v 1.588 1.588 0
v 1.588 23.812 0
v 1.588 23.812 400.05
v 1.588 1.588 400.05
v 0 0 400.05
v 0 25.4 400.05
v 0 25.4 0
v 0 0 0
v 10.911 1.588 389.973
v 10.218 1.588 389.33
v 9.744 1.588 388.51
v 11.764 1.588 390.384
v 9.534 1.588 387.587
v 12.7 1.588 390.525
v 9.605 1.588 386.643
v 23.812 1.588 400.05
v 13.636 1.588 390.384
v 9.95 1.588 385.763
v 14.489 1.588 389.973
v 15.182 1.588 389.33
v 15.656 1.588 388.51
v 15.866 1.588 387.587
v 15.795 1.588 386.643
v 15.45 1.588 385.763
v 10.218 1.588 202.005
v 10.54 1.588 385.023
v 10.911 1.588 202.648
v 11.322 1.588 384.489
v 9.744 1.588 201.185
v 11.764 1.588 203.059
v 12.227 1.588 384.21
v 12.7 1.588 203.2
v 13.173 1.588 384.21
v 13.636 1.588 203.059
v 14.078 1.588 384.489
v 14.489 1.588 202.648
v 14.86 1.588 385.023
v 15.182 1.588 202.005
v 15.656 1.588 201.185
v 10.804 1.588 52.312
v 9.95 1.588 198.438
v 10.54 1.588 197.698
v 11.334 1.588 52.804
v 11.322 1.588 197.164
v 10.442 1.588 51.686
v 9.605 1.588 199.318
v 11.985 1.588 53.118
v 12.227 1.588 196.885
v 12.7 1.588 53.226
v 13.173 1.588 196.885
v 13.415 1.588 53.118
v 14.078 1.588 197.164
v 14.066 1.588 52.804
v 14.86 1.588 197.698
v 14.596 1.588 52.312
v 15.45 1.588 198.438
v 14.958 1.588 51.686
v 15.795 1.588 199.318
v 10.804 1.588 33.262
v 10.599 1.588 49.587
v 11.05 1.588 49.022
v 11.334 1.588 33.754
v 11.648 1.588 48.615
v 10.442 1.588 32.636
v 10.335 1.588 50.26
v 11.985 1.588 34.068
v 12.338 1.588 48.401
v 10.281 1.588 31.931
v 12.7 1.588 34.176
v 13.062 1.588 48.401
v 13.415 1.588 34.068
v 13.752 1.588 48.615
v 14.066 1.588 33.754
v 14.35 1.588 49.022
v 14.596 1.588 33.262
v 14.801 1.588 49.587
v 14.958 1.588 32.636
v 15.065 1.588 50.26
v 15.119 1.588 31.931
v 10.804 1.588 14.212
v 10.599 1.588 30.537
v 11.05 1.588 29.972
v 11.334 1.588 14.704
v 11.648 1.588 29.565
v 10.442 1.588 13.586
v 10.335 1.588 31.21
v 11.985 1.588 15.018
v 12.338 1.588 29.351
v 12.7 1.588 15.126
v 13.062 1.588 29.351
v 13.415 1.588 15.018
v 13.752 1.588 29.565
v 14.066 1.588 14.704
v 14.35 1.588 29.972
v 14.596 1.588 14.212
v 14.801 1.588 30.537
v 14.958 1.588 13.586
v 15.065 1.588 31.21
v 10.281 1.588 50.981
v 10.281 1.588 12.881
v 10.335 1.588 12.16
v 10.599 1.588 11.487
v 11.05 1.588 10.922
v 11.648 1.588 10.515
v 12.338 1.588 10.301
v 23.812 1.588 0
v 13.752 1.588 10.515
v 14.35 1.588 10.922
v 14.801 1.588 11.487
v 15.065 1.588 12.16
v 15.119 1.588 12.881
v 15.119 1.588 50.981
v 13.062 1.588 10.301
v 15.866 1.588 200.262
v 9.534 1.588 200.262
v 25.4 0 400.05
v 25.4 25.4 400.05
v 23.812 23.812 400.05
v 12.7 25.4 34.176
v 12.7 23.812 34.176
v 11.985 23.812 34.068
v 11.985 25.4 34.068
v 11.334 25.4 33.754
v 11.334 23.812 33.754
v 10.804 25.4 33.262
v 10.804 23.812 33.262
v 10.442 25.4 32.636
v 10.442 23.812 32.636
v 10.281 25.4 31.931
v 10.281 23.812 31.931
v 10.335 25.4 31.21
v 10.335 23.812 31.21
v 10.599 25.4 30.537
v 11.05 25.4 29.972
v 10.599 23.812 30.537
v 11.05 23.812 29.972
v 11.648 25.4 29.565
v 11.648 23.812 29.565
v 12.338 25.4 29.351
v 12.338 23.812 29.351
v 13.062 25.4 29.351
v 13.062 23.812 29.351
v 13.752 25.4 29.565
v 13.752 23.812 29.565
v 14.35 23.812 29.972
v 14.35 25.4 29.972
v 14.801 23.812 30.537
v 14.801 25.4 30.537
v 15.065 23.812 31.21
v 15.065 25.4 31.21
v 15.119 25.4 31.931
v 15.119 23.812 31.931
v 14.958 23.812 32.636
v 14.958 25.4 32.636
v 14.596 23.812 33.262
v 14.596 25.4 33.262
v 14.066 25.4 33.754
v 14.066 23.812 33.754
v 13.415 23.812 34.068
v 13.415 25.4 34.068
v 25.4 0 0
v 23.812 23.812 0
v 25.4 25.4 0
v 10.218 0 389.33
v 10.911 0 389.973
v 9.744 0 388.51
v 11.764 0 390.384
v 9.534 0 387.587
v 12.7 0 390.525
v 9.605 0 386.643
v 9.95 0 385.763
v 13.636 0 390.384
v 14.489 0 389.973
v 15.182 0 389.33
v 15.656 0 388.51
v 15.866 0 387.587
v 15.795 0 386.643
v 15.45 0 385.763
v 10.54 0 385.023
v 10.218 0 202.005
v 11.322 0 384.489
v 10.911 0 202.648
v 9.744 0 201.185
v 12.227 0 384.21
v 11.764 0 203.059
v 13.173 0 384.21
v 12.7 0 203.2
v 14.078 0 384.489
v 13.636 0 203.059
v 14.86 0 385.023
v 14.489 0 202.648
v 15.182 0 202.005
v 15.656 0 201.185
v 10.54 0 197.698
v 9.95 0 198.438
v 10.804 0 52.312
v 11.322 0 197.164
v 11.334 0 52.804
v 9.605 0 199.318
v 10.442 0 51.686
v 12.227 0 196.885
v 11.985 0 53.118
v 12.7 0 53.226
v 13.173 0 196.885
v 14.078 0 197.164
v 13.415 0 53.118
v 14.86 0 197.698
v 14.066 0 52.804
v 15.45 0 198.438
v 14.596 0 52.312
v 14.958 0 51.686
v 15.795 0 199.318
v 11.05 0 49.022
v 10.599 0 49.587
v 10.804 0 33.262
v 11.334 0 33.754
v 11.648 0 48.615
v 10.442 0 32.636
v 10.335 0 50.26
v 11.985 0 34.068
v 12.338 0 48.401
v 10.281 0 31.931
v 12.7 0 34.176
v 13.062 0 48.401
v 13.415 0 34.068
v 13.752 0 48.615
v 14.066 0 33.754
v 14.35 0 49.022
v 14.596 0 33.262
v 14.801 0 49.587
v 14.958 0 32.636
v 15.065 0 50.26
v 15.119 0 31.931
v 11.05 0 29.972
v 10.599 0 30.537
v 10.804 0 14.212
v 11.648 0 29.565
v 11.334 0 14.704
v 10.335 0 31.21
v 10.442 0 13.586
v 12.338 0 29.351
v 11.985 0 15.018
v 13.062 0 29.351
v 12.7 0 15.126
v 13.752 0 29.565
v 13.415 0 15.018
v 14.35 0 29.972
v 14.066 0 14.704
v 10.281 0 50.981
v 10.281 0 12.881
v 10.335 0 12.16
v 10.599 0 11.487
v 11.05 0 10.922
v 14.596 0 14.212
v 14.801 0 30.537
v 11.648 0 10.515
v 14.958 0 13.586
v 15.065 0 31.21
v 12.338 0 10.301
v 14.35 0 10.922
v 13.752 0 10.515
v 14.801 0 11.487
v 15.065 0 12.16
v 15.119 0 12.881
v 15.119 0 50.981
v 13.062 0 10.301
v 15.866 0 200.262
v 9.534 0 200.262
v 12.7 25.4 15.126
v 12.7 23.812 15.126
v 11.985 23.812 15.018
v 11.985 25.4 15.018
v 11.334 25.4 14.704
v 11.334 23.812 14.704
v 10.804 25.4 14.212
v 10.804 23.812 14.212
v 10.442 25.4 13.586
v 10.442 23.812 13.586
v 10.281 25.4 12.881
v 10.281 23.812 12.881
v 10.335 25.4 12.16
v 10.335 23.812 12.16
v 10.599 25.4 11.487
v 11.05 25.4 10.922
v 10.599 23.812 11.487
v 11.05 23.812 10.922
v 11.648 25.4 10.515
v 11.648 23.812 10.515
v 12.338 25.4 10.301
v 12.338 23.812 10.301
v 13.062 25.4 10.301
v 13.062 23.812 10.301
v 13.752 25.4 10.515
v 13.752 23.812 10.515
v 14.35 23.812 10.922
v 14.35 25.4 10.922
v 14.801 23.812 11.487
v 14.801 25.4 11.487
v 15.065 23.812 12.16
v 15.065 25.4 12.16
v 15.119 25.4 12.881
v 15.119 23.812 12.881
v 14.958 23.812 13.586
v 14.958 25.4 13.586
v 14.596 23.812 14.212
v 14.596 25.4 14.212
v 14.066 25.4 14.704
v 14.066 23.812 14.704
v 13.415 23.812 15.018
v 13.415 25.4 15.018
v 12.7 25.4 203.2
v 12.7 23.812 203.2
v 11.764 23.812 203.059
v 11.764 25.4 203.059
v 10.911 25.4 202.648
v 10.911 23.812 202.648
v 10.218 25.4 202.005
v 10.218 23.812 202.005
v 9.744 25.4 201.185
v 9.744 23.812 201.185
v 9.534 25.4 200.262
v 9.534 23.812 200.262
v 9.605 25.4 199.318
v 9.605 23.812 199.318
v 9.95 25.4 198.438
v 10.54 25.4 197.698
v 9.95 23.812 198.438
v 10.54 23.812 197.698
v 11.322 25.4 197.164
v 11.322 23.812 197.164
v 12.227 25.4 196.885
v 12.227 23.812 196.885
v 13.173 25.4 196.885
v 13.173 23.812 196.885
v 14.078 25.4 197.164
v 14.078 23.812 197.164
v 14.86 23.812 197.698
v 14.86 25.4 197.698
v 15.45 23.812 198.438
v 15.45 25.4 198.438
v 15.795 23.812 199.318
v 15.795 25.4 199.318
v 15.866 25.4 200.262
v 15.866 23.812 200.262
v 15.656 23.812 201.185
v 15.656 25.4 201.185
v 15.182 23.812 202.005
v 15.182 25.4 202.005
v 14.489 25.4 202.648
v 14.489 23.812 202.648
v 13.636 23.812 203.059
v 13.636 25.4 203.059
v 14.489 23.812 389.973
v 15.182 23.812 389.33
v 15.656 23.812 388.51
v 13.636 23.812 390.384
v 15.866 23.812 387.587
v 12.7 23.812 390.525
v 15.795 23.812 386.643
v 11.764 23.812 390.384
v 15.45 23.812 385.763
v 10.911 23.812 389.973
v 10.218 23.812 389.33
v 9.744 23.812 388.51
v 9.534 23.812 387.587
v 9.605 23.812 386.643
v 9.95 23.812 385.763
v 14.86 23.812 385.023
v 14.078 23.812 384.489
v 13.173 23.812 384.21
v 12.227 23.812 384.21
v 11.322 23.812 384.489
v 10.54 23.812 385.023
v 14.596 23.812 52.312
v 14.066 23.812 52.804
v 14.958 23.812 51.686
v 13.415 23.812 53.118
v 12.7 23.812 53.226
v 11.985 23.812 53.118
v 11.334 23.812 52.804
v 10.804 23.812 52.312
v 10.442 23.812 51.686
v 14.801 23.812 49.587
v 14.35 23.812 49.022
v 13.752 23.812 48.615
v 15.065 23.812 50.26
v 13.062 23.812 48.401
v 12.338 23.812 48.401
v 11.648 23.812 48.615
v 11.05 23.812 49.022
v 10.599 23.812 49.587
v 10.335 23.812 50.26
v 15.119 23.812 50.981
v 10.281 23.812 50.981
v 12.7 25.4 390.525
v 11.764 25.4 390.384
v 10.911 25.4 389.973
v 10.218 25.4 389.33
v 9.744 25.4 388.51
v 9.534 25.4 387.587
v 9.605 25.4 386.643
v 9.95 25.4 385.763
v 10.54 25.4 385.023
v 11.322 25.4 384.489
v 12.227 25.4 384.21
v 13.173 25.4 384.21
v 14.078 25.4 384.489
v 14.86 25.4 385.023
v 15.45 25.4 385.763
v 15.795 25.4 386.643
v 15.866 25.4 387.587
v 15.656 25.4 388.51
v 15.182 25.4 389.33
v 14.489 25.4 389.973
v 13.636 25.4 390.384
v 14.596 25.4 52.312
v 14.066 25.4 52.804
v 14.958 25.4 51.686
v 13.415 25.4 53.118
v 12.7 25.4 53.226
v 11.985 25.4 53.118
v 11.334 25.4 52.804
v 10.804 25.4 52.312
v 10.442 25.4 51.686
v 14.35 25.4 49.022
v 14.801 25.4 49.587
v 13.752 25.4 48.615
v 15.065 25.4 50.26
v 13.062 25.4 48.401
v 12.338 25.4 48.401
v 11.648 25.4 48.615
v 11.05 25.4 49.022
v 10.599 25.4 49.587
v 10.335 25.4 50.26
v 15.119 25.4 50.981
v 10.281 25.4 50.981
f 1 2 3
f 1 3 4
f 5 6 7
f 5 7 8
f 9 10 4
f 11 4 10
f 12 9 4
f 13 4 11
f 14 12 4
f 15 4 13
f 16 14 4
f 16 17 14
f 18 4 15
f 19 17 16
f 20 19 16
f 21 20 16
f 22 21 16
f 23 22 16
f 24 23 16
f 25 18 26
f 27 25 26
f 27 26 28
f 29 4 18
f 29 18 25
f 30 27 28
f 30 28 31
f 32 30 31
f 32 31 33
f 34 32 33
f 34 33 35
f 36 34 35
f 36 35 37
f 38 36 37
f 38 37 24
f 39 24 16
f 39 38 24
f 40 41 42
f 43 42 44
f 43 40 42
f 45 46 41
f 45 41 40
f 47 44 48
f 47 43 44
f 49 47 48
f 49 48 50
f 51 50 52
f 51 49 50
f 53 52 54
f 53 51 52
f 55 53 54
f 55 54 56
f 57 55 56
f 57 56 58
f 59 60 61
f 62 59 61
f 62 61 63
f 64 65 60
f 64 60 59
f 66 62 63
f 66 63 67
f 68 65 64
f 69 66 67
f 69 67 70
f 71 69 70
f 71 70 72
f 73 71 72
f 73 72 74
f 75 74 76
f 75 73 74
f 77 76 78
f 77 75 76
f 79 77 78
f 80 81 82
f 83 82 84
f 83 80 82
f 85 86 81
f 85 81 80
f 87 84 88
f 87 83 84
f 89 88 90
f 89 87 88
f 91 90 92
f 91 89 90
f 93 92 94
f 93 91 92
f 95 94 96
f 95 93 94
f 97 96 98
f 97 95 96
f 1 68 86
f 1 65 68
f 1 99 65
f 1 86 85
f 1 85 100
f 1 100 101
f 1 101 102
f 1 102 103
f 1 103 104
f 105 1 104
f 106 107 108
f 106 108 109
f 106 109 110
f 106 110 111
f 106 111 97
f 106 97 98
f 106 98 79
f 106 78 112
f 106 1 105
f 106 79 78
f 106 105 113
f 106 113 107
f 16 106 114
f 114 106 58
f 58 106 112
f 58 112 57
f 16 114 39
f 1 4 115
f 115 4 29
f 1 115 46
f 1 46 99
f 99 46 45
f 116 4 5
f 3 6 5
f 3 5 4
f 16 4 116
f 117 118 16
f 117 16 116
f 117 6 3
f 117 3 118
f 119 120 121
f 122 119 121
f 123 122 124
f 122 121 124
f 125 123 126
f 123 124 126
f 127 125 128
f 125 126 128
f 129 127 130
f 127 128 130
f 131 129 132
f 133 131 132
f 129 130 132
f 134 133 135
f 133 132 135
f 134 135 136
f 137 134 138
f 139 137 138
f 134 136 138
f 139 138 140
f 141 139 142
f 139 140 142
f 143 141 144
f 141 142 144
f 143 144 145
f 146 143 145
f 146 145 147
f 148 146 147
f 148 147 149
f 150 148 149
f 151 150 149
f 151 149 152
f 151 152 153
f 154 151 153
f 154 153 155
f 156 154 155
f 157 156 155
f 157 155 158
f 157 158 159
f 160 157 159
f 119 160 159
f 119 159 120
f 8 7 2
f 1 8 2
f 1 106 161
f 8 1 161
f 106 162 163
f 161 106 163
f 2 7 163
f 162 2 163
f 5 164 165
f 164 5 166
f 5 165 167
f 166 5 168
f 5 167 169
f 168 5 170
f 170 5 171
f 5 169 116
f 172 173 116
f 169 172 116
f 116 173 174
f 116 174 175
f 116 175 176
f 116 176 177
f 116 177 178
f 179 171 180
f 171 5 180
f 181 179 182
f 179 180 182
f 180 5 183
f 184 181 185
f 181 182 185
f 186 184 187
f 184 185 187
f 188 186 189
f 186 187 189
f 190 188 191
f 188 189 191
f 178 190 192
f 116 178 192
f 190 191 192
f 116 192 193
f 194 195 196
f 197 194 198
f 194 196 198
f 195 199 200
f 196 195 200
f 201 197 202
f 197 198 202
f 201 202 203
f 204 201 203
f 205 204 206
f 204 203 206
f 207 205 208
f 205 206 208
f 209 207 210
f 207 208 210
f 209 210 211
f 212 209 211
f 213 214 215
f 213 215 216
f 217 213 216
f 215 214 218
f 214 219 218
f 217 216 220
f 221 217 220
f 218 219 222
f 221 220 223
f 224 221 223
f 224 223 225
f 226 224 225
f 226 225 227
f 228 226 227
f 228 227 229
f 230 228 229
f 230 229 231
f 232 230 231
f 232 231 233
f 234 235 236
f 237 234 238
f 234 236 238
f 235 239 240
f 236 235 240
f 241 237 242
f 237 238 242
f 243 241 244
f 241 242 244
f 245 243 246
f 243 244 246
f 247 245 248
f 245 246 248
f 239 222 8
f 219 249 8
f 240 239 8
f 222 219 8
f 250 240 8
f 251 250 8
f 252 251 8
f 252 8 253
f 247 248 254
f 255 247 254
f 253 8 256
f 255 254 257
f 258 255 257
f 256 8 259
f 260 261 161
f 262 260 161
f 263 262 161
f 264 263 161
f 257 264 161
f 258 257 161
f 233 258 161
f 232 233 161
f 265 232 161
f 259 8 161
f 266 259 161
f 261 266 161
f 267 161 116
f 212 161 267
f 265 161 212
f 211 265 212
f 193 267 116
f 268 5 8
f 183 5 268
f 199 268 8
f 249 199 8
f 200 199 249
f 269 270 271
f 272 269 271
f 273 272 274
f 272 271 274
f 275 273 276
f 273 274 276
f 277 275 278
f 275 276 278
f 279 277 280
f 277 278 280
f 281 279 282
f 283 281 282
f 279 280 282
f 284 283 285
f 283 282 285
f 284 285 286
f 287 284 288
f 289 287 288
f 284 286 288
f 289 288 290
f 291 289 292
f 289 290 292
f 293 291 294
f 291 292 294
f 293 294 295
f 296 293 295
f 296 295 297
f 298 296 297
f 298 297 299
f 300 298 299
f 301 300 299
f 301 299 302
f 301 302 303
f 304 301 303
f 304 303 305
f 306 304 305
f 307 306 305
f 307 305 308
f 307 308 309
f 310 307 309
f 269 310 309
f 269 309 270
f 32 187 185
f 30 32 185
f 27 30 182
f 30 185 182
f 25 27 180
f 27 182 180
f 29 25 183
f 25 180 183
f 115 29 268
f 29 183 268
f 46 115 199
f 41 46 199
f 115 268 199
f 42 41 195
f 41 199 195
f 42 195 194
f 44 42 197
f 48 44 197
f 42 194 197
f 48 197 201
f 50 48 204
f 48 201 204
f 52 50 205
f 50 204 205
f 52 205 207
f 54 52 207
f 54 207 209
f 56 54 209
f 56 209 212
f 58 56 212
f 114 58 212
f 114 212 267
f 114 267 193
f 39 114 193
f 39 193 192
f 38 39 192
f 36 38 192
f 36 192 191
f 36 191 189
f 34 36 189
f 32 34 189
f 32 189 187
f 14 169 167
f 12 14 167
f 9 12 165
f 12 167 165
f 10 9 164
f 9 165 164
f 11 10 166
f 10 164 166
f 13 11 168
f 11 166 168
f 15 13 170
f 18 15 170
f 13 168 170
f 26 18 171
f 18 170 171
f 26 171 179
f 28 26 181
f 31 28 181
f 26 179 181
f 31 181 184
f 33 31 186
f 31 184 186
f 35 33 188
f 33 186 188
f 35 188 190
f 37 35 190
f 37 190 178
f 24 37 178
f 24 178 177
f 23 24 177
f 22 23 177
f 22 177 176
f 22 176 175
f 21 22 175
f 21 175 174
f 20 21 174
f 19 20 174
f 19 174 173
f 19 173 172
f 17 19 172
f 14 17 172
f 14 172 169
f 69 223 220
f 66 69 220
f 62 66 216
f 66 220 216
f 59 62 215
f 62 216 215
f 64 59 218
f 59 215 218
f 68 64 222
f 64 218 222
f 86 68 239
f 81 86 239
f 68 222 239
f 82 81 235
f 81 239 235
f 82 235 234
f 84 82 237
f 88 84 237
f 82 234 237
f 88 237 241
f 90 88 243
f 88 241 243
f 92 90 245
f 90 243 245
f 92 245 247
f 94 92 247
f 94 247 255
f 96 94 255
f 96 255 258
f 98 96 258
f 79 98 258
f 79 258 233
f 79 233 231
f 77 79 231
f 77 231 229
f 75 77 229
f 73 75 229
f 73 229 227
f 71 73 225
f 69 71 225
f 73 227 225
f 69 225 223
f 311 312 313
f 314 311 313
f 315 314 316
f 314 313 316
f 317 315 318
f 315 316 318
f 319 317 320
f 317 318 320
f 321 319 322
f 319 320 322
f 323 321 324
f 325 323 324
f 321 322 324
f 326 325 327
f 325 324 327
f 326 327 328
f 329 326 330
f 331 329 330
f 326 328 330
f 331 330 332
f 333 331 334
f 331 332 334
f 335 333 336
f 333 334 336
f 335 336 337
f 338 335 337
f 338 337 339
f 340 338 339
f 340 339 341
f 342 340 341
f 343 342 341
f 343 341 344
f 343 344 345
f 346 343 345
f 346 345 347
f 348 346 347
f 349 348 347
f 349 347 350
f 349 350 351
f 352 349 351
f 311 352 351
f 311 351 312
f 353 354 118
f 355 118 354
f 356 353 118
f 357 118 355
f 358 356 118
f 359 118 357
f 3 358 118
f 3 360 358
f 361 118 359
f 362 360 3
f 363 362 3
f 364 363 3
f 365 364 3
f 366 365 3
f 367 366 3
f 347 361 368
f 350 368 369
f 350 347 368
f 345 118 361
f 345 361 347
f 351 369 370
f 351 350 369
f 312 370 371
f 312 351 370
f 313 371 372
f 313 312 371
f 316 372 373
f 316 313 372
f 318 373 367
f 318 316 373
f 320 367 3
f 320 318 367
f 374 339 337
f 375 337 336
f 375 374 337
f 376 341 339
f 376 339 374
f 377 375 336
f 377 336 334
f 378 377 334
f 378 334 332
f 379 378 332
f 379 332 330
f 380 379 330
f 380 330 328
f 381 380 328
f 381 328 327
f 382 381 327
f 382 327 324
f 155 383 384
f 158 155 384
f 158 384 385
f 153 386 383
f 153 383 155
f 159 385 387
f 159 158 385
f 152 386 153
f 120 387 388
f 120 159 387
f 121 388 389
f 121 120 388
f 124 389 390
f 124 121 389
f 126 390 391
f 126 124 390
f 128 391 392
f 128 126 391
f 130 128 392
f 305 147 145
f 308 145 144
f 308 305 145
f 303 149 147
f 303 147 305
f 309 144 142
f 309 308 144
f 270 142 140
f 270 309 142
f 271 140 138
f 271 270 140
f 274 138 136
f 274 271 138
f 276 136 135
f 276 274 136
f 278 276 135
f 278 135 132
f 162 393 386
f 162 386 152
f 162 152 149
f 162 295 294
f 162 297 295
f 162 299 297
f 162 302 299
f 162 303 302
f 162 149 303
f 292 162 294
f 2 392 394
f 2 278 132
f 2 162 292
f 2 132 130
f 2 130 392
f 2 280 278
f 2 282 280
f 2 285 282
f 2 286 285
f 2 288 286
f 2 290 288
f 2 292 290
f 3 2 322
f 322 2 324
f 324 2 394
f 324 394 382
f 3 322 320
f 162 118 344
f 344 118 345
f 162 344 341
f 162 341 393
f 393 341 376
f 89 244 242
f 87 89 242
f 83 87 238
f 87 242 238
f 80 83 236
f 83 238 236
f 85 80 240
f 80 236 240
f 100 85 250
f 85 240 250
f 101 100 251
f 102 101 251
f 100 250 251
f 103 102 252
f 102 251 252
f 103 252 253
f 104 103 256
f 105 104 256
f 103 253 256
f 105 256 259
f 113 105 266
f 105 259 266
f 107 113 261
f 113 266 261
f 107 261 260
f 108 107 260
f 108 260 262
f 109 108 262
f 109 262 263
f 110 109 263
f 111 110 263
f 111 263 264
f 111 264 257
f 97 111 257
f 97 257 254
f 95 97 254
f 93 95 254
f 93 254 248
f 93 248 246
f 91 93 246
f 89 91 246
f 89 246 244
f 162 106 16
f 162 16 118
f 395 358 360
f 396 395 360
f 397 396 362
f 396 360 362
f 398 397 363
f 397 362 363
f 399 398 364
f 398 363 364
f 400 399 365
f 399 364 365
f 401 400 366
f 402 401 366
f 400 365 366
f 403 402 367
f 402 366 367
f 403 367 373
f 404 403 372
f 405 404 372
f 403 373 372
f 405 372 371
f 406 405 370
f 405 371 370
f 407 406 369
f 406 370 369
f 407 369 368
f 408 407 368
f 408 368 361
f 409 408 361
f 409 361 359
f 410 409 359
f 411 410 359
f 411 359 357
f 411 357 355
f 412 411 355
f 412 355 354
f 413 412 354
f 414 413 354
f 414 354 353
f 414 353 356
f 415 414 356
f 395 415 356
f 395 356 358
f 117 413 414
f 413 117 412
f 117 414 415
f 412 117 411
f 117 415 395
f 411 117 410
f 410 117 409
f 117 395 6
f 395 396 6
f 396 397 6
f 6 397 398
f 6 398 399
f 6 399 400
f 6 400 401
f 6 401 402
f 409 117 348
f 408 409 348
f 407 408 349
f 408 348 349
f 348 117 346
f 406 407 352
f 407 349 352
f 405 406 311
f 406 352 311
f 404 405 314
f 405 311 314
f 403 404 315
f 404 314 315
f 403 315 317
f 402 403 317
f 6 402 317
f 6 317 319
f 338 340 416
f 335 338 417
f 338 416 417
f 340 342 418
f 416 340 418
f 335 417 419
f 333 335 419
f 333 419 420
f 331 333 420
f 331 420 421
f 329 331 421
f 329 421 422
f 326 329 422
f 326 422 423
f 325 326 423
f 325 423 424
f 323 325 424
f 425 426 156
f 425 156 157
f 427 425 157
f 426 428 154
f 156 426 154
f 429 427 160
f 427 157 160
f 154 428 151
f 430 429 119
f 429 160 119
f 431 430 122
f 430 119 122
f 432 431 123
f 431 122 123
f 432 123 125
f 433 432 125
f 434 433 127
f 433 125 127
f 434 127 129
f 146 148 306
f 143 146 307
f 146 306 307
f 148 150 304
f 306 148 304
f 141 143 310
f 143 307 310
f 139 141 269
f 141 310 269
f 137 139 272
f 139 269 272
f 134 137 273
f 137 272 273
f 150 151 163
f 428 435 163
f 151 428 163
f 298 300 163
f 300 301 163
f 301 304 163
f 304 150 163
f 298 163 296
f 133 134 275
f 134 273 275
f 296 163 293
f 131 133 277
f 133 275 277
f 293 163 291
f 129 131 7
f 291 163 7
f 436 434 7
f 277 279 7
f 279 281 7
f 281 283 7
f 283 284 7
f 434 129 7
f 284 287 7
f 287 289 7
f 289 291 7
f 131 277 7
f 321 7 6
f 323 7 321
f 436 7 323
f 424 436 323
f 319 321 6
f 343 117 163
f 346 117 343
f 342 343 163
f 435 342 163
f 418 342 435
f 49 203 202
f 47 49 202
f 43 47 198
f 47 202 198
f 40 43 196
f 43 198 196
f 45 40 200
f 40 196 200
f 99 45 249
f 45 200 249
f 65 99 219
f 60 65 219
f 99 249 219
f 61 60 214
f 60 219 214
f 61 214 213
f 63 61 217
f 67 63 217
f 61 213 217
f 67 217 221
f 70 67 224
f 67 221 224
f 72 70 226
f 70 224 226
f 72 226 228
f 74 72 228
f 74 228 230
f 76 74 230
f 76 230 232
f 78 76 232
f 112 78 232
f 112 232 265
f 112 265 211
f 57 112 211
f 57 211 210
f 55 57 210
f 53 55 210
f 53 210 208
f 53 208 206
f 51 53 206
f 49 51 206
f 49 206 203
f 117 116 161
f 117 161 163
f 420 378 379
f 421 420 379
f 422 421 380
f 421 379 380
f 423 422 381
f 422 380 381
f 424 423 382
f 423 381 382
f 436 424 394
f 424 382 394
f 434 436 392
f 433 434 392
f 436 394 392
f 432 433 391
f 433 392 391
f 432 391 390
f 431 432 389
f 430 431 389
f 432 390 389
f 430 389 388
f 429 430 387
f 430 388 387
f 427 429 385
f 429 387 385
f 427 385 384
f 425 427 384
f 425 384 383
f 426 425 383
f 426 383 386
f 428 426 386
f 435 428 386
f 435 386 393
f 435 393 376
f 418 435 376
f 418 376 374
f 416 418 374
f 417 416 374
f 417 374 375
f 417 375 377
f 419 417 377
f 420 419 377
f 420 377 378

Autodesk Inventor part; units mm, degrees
ref_plane "YZ Plane" through (0, 0, 0) normal (1, 0, 0) x (0, 1, 0)
ref_plane "XZ Plane" through (0, 0, 0) normal (0, 1, 0) x (-1, 0, 0)
ref_plane "XY Plane" through (0, 0, 0) normal (0, 0, 1) x (1, 0, 0)
sketch "Sketch1" plane through (0, 0, 0) normal (0, 0, 1) x (1, 0, 0)
  line L0 (0, 0) -> (25.4, 0)
  line L1 (25.4, 0) -> (25.4, 25.4)
  line L2 (25.4, 25.4) -> (0, 25.4)
  line L3 (0, 25.4) -> (0, 0)
  line L4 (1.5875, 1.5875) -> (23.8125, 1.5875)
  line L5 (23.8125, 1.5875) -> (23.8125, 23.8125)
  line L6 (23.8125, 23.8125) -> (1.5875, 23.8125)
  line L7 (1.5875, 23.8125) -> (1.5875, 1.5875)
  dimension "d0" = 25.4
  dimension "d1" = 25.4
  dimension "d2" = 1.5875
extrude "Extrusion1" add sketch "Sketch1" along normal blind 400.05
sketch "Sketch3" plane through (0, 25.4, 0) normal (0, 1, 0) x (1, 0, 0)
  line L0 (25.4, 0) -> (0, 0) projected
  line L1 (0, 0) -> (0, -400.05) projected
  line L2 (25.4, -400.05) -> (0, -400.05) projected
  line L3 (25.4, 0) -> (25.4, -400.05) projected
  point P0 (0, 0)
  point P1 (12.7, -200.025)
  dimension "d15" = 200.025
  dimension "d16" = 400.05
  dimension "d17" = 12.7
hole "Hole2" at (12.7, 25.4, 200.025) direction (0, -1, 0) diameter 6.35 end through all clearance for "Flat Head Machine Screw (82)" size "1/4" standard "Ansi Unified Screw Threads"
sketch "Sketch4" plane through (0, 25.4, 0) normal (0, 1, 0) x (1, 0, 0)
  circle A0 centre (12.7, -200.025) radius 3.175 projected
  line L0 (25.4, 0) -> (0, 0) projected
  line L1 (0, 0) -> (0, -400.05) projected
  line L2 (25.4, -400.05) -> (0, -400.05) projected
  line L3 (25.4, 0) -> (25.4, -400.05) projected
  point P0 (0, 0)
  point P1 (12.7, -387.35)
  dimension "d25" = 12.7
  dimension "d26" = 12.7
  dimension "d27" = 12.7
hole "Hole3" at (12.7, 25.4, 387.35) direction (0, -1, 0) diameter 6.35 end through all
sketch "Sketch5" plane through (0, 25.4, 0) normal (0, 1, 0) x (1, 0, 0)
  line L0 (25.4, 0) -> (0, 0) projected
  line L1 (25.4, 0) -> (25.4, -400.05) projected
  point P0 (12.7, -12.7)
  dimension "d35" = 12.7
  dimension "d36" = 12.7
hole "Hole4" at (12.7, 25.4, 12.7) direction (0, -1, 0) diameter 4.8514 end through all
pattern_linear "Rectangular Pattern1" count 3 spacing 19.05 along (0, 0, 1) of "Hole4"
equation "\"d15\" = 0.5 * d16"
equation "\"d25\" = d26"
properties part number "CLB_042_FourPartScissorBarBottom" material "Aluminum 6061"
